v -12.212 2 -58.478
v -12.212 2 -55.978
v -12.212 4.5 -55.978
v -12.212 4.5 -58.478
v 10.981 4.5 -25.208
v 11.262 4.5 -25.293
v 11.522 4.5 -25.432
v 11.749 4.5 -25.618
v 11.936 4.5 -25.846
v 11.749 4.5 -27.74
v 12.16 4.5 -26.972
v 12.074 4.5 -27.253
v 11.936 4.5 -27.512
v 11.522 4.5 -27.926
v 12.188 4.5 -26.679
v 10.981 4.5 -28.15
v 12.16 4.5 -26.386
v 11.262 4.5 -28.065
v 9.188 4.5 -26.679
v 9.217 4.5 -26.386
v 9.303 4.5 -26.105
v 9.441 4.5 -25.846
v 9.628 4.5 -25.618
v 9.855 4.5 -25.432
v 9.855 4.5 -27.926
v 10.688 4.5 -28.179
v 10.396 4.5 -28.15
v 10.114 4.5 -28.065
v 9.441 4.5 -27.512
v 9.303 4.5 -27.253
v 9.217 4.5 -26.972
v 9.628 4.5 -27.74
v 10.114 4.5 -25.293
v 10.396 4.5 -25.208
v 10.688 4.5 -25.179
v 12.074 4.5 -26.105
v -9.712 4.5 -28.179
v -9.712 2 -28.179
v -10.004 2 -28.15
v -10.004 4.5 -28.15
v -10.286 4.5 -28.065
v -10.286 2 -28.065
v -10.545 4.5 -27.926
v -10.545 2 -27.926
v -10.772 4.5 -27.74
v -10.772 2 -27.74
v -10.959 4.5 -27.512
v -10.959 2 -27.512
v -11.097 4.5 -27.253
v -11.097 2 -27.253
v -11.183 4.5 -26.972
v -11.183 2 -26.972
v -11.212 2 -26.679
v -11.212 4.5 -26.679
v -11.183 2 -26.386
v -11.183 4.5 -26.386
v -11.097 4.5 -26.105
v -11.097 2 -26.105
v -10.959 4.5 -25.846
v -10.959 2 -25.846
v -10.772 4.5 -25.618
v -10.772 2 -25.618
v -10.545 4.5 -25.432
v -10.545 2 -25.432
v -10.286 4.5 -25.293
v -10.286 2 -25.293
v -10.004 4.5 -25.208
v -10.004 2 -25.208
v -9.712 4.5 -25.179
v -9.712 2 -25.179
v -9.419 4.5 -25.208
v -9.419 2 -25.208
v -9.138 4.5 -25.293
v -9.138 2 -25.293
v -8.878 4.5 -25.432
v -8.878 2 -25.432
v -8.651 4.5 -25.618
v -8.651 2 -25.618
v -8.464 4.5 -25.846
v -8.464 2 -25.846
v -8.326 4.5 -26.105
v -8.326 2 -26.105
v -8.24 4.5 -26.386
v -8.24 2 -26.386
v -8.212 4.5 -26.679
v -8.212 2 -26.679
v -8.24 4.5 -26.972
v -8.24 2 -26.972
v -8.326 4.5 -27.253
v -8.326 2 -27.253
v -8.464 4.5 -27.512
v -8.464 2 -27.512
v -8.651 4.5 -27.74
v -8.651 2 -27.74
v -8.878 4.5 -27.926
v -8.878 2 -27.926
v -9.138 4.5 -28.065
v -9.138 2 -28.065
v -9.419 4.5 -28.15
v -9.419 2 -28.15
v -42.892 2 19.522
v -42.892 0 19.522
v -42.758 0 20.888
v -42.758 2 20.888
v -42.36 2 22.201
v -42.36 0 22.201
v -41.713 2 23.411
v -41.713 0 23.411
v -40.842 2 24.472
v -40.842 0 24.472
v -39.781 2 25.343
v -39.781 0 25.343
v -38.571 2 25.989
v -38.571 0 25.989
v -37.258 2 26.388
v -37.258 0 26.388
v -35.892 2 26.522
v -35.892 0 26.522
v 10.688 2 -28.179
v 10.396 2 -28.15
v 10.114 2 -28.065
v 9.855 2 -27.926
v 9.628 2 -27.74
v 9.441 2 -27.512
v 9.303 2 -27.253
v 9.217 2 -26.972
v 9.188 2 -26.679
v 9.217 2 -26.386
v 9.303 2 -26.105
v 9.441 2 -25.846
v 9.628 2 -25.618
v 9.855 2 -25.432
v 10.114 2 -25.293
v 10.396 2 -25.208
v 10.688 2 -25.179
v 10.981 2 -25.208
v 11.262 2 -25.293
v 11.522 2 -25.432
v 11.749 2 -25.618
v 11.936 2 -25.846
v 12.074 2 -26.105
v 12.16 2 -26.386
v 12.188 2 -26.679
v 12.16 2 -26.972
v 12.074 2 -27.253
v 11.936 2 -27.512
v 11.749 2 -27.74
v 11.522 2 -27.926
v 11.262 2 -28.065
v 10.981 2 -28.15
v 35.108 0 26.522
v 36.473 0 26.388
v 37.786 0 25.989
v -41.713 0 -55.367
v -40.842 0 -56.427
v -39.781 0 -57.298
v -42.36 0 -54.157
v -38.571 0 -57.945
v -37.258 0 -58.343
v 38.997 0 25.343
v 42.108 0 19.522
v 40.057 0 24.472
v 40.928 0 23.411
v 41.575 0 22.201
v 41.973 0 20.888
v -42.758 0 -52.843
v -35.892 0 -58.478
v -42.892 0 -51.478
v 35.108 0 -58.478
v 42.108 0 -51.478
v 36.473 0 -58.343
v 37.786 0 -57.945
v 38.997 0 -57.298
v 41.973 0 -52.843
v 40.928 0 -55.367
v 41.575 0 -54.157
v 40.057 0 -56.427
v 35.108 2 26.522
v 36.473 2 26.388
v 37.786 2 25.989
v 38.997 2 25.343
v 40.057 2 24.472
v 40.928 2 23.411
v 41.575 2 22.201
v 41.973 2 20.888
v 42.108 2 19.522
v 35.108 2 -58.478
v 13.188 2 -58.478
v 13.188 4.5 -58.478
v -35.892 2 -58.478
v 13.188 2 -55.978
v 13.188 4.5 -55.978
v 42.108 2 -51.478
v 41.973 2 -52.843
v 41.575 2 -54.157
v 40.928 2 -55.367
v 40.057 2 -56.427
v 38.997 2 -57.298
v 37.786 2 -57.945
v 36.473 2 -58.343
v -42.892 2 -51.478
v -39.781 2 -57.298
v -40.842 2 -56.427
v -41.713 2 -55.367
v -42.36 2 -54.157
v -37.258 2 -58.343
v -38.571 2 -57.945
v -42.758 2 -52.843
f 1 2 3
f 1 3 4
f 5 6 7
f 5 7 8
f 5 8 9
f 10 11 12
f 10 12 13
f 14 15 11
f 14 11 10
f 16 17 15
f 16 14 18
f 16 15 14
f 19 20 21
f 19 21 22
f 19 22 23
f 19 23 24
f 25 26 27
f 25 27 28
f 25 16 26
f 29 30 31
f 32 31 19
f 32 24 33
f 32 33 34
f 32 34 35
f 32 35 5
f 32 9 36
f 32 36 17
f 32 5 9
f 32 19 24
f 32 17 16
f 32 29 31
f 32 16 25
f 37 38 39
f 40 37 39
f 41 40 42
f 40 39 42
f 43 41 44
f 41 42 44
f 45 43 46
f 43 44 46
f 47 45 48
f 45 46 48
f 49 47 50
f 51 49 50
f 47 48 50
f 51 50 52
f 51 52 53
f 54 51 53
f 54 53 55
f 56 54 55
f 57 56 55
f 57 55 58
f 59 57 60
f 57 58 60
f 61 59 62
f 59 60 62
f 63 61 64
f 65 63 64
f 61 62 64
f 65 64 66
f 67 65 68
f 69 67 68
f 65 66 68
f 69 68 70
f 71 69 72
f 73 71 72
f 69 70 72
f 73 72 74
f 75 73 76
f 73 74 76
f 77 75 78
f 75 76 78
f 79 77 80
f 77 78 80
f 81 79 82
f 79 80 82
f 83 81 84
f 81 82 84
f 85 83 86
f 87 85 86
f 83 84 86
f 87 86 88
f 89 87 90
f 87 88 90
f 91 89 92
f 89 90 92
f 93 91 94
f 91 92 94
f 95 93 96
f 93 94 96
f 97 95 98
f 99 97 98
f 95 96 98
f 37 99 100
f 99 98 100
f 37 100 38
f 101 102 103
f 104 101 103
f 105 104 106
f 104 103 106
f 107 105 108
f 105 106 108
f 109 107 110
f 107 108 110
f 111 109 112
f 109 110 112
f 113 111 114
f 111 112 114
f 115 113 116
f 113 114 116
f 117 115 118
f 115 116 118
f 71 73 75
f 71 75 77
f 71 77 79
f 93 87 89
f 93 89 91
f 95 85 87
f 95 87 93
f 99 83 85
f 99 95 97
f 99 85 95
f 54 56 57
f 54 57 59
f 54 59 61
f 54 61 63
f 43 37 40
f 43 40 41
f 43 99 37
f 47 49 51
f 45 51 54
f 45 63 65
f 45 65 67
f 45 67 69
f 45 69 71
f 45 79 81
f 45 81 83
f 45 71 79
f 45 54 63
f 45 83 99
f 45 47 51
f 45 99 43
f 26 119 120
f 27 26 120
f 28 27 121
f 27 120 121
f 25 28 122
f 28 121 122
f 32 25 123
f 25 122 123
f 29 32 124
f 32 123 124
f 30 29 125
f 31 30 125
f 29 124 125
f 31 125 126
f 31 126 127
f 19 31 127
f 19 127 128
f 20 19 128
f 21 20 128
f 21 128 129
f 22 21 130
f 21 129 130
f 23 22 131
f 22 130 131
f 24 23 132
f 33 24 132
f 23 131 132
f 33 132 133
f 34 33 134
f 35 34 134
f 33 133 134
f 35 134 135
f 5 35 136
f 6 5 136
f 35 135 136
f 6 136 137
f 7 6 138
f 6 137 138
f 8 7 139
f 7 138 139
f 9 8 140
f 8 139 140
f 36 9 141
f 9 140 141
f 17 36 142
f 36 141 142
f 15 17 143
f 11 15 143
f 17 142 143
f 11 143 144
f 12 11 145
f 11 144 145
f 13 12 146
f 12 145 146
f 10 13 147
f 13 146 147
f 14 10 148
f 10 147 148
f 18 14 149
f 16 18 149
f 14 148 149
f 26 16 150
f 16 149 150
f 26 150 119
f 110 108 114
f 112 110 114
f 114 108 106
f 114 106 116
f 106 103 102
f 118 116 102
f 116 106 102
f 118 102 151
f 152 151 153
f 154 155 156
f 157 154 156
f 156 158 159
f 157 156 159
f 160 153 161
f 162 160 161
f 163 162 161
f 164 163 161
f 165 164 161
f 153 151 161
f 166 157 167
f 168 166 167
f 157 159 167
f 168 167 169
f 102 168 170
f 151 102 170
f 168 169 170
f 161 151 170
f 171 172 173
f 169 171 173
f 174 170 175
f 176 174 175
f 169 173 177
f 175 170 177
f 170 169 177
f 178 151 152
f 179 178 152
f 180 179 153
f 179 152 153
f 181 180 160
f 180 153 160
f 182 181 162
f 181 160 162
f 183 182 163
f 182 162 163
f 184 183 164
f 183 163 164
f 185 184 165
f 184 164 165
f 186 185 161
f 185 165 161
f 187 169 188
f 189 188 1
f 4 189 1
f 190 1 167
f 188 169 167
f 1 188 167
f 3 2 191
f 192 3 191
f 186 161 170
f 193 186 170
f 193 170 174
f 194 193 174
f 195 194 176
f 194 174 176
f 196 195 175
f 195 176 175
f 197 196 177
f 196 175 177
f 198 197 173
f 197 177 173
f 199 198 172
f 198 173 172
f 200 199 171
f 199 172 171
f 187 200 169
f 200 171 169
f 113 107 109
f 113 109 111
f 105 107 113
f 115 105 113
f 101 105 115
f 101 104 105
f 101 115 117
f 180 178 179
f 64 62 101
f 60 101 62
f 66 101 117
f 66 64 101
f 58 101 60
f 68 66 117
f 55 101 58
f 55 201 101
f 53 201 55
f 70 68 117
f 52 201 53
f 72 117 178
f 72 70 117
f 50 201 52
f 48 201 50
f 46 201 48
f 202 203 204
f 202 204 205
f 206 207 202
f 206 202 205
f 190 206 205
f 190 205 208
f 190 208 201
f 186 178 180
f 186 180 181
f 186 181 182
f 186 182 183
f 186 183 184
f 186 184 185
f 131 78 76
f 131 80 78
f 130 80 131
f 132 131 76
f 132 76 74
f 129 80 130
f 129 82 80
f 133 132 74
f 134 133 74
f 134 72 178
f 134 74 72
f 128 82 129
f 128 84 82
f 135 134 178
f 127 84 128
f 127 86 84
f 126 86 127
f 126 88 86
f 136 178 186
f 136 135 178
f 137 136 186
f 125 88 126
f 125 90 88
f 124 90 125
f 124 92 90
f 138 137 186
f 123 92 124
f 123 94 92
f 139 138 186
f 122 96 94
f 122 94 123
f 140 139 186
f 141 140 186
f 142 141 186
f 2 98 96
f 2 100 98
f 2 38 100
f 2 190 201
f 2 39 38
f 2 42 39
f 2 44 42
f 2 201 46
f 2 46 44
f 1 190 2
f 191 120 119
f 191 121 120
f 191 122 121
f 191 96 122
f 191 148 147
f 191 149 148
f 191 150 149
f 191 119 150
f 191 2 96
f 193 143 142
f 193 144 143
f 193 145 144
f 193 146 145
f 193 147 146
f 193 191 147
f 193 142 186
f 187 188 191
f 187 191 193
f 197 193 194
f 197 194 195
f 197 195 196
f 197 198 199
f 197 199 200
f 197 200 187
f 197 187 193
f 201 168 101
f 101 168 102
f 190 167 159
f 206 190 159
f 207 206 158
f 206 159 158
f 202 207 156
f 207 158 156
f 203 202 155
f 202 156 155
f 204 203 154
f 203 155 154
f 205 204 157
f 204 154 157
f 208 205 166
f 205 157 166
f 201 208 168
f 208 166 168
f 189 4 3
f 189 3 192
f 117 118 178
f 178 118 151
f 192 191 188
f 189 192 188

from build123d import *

# Parameters (mm, degrees)
BOSS_EXTRUDE1_DEPTH = 2
SKETCH2_R           = 1.5
SKETCH2_W           = 25.4
SKETCH2_H           = 2.5
BOSS_EXTRUDE2_DEPTH = 2.5


with BuildPart() as part:
    # Sketch1 → Boss-Extrude1 (new body)
    with BuildSketch(Plane(origin=(0, 0, 0), x_dir=(1, 0, 0), z_dir=(0, 1, 0))):
        with BuildLine():
            Line((-35.892490242, -26.522279469), (35.107509758, -26.522279469))
            ThreePointArc((35.107509758, -26.522279469), (40.057257226, -24.472026937), (42.107509758, -19.522279469))
            Line((42.107509758, -19.522279469), (42.107509758, 51.477720531))
            ThreePointArc((42.107509758, 51.477720531), (40.057257226, 56.427467999), (35.107509758, 58.477720531))
            Line((35.107509758, 58.477720531), (-35.892490242, 58.477720531))
            ThreePointArc((-35.892490242, 58.477720531), (-40.84223771, 56.427467999), (-42.892490242, 51.477720531))
            Line((-42.892490242, 51.477720531), (-42.892490242, -19.522279469))
            ThreePointArc((-42.892490242, -19.522279469), (-40.84223771, -24.472026937), (-35.892490242, -26.522279469))
        make_face()
    extrude(amount=BOSS_EXTRUDE1_DEPTH)

    # Sketch2 → Boss-Extrude2 (add)
    with BuildSketch(Plane(origin=(0, 2, 0), x_dir=(1, 0, 0), z_dir=(0, 1, 0))):
        with Locations(Location((-9.711578579, 26.678960322, 0), (0, 0, 90))):
            Circle(SKETCH2_R)
        with Locations(Location((10.688421421, 26.678960322, 0), (0, 0, 90))):
            Circle(SKETCH2_R)
        with Locations((0.488421421, 57.227720531)):
            Rectangle(SKETCH2_W, SKETCH2_H)
    extrude(amount=BOSS_EXTRUDE2_DEPTH)


solid = part.part
